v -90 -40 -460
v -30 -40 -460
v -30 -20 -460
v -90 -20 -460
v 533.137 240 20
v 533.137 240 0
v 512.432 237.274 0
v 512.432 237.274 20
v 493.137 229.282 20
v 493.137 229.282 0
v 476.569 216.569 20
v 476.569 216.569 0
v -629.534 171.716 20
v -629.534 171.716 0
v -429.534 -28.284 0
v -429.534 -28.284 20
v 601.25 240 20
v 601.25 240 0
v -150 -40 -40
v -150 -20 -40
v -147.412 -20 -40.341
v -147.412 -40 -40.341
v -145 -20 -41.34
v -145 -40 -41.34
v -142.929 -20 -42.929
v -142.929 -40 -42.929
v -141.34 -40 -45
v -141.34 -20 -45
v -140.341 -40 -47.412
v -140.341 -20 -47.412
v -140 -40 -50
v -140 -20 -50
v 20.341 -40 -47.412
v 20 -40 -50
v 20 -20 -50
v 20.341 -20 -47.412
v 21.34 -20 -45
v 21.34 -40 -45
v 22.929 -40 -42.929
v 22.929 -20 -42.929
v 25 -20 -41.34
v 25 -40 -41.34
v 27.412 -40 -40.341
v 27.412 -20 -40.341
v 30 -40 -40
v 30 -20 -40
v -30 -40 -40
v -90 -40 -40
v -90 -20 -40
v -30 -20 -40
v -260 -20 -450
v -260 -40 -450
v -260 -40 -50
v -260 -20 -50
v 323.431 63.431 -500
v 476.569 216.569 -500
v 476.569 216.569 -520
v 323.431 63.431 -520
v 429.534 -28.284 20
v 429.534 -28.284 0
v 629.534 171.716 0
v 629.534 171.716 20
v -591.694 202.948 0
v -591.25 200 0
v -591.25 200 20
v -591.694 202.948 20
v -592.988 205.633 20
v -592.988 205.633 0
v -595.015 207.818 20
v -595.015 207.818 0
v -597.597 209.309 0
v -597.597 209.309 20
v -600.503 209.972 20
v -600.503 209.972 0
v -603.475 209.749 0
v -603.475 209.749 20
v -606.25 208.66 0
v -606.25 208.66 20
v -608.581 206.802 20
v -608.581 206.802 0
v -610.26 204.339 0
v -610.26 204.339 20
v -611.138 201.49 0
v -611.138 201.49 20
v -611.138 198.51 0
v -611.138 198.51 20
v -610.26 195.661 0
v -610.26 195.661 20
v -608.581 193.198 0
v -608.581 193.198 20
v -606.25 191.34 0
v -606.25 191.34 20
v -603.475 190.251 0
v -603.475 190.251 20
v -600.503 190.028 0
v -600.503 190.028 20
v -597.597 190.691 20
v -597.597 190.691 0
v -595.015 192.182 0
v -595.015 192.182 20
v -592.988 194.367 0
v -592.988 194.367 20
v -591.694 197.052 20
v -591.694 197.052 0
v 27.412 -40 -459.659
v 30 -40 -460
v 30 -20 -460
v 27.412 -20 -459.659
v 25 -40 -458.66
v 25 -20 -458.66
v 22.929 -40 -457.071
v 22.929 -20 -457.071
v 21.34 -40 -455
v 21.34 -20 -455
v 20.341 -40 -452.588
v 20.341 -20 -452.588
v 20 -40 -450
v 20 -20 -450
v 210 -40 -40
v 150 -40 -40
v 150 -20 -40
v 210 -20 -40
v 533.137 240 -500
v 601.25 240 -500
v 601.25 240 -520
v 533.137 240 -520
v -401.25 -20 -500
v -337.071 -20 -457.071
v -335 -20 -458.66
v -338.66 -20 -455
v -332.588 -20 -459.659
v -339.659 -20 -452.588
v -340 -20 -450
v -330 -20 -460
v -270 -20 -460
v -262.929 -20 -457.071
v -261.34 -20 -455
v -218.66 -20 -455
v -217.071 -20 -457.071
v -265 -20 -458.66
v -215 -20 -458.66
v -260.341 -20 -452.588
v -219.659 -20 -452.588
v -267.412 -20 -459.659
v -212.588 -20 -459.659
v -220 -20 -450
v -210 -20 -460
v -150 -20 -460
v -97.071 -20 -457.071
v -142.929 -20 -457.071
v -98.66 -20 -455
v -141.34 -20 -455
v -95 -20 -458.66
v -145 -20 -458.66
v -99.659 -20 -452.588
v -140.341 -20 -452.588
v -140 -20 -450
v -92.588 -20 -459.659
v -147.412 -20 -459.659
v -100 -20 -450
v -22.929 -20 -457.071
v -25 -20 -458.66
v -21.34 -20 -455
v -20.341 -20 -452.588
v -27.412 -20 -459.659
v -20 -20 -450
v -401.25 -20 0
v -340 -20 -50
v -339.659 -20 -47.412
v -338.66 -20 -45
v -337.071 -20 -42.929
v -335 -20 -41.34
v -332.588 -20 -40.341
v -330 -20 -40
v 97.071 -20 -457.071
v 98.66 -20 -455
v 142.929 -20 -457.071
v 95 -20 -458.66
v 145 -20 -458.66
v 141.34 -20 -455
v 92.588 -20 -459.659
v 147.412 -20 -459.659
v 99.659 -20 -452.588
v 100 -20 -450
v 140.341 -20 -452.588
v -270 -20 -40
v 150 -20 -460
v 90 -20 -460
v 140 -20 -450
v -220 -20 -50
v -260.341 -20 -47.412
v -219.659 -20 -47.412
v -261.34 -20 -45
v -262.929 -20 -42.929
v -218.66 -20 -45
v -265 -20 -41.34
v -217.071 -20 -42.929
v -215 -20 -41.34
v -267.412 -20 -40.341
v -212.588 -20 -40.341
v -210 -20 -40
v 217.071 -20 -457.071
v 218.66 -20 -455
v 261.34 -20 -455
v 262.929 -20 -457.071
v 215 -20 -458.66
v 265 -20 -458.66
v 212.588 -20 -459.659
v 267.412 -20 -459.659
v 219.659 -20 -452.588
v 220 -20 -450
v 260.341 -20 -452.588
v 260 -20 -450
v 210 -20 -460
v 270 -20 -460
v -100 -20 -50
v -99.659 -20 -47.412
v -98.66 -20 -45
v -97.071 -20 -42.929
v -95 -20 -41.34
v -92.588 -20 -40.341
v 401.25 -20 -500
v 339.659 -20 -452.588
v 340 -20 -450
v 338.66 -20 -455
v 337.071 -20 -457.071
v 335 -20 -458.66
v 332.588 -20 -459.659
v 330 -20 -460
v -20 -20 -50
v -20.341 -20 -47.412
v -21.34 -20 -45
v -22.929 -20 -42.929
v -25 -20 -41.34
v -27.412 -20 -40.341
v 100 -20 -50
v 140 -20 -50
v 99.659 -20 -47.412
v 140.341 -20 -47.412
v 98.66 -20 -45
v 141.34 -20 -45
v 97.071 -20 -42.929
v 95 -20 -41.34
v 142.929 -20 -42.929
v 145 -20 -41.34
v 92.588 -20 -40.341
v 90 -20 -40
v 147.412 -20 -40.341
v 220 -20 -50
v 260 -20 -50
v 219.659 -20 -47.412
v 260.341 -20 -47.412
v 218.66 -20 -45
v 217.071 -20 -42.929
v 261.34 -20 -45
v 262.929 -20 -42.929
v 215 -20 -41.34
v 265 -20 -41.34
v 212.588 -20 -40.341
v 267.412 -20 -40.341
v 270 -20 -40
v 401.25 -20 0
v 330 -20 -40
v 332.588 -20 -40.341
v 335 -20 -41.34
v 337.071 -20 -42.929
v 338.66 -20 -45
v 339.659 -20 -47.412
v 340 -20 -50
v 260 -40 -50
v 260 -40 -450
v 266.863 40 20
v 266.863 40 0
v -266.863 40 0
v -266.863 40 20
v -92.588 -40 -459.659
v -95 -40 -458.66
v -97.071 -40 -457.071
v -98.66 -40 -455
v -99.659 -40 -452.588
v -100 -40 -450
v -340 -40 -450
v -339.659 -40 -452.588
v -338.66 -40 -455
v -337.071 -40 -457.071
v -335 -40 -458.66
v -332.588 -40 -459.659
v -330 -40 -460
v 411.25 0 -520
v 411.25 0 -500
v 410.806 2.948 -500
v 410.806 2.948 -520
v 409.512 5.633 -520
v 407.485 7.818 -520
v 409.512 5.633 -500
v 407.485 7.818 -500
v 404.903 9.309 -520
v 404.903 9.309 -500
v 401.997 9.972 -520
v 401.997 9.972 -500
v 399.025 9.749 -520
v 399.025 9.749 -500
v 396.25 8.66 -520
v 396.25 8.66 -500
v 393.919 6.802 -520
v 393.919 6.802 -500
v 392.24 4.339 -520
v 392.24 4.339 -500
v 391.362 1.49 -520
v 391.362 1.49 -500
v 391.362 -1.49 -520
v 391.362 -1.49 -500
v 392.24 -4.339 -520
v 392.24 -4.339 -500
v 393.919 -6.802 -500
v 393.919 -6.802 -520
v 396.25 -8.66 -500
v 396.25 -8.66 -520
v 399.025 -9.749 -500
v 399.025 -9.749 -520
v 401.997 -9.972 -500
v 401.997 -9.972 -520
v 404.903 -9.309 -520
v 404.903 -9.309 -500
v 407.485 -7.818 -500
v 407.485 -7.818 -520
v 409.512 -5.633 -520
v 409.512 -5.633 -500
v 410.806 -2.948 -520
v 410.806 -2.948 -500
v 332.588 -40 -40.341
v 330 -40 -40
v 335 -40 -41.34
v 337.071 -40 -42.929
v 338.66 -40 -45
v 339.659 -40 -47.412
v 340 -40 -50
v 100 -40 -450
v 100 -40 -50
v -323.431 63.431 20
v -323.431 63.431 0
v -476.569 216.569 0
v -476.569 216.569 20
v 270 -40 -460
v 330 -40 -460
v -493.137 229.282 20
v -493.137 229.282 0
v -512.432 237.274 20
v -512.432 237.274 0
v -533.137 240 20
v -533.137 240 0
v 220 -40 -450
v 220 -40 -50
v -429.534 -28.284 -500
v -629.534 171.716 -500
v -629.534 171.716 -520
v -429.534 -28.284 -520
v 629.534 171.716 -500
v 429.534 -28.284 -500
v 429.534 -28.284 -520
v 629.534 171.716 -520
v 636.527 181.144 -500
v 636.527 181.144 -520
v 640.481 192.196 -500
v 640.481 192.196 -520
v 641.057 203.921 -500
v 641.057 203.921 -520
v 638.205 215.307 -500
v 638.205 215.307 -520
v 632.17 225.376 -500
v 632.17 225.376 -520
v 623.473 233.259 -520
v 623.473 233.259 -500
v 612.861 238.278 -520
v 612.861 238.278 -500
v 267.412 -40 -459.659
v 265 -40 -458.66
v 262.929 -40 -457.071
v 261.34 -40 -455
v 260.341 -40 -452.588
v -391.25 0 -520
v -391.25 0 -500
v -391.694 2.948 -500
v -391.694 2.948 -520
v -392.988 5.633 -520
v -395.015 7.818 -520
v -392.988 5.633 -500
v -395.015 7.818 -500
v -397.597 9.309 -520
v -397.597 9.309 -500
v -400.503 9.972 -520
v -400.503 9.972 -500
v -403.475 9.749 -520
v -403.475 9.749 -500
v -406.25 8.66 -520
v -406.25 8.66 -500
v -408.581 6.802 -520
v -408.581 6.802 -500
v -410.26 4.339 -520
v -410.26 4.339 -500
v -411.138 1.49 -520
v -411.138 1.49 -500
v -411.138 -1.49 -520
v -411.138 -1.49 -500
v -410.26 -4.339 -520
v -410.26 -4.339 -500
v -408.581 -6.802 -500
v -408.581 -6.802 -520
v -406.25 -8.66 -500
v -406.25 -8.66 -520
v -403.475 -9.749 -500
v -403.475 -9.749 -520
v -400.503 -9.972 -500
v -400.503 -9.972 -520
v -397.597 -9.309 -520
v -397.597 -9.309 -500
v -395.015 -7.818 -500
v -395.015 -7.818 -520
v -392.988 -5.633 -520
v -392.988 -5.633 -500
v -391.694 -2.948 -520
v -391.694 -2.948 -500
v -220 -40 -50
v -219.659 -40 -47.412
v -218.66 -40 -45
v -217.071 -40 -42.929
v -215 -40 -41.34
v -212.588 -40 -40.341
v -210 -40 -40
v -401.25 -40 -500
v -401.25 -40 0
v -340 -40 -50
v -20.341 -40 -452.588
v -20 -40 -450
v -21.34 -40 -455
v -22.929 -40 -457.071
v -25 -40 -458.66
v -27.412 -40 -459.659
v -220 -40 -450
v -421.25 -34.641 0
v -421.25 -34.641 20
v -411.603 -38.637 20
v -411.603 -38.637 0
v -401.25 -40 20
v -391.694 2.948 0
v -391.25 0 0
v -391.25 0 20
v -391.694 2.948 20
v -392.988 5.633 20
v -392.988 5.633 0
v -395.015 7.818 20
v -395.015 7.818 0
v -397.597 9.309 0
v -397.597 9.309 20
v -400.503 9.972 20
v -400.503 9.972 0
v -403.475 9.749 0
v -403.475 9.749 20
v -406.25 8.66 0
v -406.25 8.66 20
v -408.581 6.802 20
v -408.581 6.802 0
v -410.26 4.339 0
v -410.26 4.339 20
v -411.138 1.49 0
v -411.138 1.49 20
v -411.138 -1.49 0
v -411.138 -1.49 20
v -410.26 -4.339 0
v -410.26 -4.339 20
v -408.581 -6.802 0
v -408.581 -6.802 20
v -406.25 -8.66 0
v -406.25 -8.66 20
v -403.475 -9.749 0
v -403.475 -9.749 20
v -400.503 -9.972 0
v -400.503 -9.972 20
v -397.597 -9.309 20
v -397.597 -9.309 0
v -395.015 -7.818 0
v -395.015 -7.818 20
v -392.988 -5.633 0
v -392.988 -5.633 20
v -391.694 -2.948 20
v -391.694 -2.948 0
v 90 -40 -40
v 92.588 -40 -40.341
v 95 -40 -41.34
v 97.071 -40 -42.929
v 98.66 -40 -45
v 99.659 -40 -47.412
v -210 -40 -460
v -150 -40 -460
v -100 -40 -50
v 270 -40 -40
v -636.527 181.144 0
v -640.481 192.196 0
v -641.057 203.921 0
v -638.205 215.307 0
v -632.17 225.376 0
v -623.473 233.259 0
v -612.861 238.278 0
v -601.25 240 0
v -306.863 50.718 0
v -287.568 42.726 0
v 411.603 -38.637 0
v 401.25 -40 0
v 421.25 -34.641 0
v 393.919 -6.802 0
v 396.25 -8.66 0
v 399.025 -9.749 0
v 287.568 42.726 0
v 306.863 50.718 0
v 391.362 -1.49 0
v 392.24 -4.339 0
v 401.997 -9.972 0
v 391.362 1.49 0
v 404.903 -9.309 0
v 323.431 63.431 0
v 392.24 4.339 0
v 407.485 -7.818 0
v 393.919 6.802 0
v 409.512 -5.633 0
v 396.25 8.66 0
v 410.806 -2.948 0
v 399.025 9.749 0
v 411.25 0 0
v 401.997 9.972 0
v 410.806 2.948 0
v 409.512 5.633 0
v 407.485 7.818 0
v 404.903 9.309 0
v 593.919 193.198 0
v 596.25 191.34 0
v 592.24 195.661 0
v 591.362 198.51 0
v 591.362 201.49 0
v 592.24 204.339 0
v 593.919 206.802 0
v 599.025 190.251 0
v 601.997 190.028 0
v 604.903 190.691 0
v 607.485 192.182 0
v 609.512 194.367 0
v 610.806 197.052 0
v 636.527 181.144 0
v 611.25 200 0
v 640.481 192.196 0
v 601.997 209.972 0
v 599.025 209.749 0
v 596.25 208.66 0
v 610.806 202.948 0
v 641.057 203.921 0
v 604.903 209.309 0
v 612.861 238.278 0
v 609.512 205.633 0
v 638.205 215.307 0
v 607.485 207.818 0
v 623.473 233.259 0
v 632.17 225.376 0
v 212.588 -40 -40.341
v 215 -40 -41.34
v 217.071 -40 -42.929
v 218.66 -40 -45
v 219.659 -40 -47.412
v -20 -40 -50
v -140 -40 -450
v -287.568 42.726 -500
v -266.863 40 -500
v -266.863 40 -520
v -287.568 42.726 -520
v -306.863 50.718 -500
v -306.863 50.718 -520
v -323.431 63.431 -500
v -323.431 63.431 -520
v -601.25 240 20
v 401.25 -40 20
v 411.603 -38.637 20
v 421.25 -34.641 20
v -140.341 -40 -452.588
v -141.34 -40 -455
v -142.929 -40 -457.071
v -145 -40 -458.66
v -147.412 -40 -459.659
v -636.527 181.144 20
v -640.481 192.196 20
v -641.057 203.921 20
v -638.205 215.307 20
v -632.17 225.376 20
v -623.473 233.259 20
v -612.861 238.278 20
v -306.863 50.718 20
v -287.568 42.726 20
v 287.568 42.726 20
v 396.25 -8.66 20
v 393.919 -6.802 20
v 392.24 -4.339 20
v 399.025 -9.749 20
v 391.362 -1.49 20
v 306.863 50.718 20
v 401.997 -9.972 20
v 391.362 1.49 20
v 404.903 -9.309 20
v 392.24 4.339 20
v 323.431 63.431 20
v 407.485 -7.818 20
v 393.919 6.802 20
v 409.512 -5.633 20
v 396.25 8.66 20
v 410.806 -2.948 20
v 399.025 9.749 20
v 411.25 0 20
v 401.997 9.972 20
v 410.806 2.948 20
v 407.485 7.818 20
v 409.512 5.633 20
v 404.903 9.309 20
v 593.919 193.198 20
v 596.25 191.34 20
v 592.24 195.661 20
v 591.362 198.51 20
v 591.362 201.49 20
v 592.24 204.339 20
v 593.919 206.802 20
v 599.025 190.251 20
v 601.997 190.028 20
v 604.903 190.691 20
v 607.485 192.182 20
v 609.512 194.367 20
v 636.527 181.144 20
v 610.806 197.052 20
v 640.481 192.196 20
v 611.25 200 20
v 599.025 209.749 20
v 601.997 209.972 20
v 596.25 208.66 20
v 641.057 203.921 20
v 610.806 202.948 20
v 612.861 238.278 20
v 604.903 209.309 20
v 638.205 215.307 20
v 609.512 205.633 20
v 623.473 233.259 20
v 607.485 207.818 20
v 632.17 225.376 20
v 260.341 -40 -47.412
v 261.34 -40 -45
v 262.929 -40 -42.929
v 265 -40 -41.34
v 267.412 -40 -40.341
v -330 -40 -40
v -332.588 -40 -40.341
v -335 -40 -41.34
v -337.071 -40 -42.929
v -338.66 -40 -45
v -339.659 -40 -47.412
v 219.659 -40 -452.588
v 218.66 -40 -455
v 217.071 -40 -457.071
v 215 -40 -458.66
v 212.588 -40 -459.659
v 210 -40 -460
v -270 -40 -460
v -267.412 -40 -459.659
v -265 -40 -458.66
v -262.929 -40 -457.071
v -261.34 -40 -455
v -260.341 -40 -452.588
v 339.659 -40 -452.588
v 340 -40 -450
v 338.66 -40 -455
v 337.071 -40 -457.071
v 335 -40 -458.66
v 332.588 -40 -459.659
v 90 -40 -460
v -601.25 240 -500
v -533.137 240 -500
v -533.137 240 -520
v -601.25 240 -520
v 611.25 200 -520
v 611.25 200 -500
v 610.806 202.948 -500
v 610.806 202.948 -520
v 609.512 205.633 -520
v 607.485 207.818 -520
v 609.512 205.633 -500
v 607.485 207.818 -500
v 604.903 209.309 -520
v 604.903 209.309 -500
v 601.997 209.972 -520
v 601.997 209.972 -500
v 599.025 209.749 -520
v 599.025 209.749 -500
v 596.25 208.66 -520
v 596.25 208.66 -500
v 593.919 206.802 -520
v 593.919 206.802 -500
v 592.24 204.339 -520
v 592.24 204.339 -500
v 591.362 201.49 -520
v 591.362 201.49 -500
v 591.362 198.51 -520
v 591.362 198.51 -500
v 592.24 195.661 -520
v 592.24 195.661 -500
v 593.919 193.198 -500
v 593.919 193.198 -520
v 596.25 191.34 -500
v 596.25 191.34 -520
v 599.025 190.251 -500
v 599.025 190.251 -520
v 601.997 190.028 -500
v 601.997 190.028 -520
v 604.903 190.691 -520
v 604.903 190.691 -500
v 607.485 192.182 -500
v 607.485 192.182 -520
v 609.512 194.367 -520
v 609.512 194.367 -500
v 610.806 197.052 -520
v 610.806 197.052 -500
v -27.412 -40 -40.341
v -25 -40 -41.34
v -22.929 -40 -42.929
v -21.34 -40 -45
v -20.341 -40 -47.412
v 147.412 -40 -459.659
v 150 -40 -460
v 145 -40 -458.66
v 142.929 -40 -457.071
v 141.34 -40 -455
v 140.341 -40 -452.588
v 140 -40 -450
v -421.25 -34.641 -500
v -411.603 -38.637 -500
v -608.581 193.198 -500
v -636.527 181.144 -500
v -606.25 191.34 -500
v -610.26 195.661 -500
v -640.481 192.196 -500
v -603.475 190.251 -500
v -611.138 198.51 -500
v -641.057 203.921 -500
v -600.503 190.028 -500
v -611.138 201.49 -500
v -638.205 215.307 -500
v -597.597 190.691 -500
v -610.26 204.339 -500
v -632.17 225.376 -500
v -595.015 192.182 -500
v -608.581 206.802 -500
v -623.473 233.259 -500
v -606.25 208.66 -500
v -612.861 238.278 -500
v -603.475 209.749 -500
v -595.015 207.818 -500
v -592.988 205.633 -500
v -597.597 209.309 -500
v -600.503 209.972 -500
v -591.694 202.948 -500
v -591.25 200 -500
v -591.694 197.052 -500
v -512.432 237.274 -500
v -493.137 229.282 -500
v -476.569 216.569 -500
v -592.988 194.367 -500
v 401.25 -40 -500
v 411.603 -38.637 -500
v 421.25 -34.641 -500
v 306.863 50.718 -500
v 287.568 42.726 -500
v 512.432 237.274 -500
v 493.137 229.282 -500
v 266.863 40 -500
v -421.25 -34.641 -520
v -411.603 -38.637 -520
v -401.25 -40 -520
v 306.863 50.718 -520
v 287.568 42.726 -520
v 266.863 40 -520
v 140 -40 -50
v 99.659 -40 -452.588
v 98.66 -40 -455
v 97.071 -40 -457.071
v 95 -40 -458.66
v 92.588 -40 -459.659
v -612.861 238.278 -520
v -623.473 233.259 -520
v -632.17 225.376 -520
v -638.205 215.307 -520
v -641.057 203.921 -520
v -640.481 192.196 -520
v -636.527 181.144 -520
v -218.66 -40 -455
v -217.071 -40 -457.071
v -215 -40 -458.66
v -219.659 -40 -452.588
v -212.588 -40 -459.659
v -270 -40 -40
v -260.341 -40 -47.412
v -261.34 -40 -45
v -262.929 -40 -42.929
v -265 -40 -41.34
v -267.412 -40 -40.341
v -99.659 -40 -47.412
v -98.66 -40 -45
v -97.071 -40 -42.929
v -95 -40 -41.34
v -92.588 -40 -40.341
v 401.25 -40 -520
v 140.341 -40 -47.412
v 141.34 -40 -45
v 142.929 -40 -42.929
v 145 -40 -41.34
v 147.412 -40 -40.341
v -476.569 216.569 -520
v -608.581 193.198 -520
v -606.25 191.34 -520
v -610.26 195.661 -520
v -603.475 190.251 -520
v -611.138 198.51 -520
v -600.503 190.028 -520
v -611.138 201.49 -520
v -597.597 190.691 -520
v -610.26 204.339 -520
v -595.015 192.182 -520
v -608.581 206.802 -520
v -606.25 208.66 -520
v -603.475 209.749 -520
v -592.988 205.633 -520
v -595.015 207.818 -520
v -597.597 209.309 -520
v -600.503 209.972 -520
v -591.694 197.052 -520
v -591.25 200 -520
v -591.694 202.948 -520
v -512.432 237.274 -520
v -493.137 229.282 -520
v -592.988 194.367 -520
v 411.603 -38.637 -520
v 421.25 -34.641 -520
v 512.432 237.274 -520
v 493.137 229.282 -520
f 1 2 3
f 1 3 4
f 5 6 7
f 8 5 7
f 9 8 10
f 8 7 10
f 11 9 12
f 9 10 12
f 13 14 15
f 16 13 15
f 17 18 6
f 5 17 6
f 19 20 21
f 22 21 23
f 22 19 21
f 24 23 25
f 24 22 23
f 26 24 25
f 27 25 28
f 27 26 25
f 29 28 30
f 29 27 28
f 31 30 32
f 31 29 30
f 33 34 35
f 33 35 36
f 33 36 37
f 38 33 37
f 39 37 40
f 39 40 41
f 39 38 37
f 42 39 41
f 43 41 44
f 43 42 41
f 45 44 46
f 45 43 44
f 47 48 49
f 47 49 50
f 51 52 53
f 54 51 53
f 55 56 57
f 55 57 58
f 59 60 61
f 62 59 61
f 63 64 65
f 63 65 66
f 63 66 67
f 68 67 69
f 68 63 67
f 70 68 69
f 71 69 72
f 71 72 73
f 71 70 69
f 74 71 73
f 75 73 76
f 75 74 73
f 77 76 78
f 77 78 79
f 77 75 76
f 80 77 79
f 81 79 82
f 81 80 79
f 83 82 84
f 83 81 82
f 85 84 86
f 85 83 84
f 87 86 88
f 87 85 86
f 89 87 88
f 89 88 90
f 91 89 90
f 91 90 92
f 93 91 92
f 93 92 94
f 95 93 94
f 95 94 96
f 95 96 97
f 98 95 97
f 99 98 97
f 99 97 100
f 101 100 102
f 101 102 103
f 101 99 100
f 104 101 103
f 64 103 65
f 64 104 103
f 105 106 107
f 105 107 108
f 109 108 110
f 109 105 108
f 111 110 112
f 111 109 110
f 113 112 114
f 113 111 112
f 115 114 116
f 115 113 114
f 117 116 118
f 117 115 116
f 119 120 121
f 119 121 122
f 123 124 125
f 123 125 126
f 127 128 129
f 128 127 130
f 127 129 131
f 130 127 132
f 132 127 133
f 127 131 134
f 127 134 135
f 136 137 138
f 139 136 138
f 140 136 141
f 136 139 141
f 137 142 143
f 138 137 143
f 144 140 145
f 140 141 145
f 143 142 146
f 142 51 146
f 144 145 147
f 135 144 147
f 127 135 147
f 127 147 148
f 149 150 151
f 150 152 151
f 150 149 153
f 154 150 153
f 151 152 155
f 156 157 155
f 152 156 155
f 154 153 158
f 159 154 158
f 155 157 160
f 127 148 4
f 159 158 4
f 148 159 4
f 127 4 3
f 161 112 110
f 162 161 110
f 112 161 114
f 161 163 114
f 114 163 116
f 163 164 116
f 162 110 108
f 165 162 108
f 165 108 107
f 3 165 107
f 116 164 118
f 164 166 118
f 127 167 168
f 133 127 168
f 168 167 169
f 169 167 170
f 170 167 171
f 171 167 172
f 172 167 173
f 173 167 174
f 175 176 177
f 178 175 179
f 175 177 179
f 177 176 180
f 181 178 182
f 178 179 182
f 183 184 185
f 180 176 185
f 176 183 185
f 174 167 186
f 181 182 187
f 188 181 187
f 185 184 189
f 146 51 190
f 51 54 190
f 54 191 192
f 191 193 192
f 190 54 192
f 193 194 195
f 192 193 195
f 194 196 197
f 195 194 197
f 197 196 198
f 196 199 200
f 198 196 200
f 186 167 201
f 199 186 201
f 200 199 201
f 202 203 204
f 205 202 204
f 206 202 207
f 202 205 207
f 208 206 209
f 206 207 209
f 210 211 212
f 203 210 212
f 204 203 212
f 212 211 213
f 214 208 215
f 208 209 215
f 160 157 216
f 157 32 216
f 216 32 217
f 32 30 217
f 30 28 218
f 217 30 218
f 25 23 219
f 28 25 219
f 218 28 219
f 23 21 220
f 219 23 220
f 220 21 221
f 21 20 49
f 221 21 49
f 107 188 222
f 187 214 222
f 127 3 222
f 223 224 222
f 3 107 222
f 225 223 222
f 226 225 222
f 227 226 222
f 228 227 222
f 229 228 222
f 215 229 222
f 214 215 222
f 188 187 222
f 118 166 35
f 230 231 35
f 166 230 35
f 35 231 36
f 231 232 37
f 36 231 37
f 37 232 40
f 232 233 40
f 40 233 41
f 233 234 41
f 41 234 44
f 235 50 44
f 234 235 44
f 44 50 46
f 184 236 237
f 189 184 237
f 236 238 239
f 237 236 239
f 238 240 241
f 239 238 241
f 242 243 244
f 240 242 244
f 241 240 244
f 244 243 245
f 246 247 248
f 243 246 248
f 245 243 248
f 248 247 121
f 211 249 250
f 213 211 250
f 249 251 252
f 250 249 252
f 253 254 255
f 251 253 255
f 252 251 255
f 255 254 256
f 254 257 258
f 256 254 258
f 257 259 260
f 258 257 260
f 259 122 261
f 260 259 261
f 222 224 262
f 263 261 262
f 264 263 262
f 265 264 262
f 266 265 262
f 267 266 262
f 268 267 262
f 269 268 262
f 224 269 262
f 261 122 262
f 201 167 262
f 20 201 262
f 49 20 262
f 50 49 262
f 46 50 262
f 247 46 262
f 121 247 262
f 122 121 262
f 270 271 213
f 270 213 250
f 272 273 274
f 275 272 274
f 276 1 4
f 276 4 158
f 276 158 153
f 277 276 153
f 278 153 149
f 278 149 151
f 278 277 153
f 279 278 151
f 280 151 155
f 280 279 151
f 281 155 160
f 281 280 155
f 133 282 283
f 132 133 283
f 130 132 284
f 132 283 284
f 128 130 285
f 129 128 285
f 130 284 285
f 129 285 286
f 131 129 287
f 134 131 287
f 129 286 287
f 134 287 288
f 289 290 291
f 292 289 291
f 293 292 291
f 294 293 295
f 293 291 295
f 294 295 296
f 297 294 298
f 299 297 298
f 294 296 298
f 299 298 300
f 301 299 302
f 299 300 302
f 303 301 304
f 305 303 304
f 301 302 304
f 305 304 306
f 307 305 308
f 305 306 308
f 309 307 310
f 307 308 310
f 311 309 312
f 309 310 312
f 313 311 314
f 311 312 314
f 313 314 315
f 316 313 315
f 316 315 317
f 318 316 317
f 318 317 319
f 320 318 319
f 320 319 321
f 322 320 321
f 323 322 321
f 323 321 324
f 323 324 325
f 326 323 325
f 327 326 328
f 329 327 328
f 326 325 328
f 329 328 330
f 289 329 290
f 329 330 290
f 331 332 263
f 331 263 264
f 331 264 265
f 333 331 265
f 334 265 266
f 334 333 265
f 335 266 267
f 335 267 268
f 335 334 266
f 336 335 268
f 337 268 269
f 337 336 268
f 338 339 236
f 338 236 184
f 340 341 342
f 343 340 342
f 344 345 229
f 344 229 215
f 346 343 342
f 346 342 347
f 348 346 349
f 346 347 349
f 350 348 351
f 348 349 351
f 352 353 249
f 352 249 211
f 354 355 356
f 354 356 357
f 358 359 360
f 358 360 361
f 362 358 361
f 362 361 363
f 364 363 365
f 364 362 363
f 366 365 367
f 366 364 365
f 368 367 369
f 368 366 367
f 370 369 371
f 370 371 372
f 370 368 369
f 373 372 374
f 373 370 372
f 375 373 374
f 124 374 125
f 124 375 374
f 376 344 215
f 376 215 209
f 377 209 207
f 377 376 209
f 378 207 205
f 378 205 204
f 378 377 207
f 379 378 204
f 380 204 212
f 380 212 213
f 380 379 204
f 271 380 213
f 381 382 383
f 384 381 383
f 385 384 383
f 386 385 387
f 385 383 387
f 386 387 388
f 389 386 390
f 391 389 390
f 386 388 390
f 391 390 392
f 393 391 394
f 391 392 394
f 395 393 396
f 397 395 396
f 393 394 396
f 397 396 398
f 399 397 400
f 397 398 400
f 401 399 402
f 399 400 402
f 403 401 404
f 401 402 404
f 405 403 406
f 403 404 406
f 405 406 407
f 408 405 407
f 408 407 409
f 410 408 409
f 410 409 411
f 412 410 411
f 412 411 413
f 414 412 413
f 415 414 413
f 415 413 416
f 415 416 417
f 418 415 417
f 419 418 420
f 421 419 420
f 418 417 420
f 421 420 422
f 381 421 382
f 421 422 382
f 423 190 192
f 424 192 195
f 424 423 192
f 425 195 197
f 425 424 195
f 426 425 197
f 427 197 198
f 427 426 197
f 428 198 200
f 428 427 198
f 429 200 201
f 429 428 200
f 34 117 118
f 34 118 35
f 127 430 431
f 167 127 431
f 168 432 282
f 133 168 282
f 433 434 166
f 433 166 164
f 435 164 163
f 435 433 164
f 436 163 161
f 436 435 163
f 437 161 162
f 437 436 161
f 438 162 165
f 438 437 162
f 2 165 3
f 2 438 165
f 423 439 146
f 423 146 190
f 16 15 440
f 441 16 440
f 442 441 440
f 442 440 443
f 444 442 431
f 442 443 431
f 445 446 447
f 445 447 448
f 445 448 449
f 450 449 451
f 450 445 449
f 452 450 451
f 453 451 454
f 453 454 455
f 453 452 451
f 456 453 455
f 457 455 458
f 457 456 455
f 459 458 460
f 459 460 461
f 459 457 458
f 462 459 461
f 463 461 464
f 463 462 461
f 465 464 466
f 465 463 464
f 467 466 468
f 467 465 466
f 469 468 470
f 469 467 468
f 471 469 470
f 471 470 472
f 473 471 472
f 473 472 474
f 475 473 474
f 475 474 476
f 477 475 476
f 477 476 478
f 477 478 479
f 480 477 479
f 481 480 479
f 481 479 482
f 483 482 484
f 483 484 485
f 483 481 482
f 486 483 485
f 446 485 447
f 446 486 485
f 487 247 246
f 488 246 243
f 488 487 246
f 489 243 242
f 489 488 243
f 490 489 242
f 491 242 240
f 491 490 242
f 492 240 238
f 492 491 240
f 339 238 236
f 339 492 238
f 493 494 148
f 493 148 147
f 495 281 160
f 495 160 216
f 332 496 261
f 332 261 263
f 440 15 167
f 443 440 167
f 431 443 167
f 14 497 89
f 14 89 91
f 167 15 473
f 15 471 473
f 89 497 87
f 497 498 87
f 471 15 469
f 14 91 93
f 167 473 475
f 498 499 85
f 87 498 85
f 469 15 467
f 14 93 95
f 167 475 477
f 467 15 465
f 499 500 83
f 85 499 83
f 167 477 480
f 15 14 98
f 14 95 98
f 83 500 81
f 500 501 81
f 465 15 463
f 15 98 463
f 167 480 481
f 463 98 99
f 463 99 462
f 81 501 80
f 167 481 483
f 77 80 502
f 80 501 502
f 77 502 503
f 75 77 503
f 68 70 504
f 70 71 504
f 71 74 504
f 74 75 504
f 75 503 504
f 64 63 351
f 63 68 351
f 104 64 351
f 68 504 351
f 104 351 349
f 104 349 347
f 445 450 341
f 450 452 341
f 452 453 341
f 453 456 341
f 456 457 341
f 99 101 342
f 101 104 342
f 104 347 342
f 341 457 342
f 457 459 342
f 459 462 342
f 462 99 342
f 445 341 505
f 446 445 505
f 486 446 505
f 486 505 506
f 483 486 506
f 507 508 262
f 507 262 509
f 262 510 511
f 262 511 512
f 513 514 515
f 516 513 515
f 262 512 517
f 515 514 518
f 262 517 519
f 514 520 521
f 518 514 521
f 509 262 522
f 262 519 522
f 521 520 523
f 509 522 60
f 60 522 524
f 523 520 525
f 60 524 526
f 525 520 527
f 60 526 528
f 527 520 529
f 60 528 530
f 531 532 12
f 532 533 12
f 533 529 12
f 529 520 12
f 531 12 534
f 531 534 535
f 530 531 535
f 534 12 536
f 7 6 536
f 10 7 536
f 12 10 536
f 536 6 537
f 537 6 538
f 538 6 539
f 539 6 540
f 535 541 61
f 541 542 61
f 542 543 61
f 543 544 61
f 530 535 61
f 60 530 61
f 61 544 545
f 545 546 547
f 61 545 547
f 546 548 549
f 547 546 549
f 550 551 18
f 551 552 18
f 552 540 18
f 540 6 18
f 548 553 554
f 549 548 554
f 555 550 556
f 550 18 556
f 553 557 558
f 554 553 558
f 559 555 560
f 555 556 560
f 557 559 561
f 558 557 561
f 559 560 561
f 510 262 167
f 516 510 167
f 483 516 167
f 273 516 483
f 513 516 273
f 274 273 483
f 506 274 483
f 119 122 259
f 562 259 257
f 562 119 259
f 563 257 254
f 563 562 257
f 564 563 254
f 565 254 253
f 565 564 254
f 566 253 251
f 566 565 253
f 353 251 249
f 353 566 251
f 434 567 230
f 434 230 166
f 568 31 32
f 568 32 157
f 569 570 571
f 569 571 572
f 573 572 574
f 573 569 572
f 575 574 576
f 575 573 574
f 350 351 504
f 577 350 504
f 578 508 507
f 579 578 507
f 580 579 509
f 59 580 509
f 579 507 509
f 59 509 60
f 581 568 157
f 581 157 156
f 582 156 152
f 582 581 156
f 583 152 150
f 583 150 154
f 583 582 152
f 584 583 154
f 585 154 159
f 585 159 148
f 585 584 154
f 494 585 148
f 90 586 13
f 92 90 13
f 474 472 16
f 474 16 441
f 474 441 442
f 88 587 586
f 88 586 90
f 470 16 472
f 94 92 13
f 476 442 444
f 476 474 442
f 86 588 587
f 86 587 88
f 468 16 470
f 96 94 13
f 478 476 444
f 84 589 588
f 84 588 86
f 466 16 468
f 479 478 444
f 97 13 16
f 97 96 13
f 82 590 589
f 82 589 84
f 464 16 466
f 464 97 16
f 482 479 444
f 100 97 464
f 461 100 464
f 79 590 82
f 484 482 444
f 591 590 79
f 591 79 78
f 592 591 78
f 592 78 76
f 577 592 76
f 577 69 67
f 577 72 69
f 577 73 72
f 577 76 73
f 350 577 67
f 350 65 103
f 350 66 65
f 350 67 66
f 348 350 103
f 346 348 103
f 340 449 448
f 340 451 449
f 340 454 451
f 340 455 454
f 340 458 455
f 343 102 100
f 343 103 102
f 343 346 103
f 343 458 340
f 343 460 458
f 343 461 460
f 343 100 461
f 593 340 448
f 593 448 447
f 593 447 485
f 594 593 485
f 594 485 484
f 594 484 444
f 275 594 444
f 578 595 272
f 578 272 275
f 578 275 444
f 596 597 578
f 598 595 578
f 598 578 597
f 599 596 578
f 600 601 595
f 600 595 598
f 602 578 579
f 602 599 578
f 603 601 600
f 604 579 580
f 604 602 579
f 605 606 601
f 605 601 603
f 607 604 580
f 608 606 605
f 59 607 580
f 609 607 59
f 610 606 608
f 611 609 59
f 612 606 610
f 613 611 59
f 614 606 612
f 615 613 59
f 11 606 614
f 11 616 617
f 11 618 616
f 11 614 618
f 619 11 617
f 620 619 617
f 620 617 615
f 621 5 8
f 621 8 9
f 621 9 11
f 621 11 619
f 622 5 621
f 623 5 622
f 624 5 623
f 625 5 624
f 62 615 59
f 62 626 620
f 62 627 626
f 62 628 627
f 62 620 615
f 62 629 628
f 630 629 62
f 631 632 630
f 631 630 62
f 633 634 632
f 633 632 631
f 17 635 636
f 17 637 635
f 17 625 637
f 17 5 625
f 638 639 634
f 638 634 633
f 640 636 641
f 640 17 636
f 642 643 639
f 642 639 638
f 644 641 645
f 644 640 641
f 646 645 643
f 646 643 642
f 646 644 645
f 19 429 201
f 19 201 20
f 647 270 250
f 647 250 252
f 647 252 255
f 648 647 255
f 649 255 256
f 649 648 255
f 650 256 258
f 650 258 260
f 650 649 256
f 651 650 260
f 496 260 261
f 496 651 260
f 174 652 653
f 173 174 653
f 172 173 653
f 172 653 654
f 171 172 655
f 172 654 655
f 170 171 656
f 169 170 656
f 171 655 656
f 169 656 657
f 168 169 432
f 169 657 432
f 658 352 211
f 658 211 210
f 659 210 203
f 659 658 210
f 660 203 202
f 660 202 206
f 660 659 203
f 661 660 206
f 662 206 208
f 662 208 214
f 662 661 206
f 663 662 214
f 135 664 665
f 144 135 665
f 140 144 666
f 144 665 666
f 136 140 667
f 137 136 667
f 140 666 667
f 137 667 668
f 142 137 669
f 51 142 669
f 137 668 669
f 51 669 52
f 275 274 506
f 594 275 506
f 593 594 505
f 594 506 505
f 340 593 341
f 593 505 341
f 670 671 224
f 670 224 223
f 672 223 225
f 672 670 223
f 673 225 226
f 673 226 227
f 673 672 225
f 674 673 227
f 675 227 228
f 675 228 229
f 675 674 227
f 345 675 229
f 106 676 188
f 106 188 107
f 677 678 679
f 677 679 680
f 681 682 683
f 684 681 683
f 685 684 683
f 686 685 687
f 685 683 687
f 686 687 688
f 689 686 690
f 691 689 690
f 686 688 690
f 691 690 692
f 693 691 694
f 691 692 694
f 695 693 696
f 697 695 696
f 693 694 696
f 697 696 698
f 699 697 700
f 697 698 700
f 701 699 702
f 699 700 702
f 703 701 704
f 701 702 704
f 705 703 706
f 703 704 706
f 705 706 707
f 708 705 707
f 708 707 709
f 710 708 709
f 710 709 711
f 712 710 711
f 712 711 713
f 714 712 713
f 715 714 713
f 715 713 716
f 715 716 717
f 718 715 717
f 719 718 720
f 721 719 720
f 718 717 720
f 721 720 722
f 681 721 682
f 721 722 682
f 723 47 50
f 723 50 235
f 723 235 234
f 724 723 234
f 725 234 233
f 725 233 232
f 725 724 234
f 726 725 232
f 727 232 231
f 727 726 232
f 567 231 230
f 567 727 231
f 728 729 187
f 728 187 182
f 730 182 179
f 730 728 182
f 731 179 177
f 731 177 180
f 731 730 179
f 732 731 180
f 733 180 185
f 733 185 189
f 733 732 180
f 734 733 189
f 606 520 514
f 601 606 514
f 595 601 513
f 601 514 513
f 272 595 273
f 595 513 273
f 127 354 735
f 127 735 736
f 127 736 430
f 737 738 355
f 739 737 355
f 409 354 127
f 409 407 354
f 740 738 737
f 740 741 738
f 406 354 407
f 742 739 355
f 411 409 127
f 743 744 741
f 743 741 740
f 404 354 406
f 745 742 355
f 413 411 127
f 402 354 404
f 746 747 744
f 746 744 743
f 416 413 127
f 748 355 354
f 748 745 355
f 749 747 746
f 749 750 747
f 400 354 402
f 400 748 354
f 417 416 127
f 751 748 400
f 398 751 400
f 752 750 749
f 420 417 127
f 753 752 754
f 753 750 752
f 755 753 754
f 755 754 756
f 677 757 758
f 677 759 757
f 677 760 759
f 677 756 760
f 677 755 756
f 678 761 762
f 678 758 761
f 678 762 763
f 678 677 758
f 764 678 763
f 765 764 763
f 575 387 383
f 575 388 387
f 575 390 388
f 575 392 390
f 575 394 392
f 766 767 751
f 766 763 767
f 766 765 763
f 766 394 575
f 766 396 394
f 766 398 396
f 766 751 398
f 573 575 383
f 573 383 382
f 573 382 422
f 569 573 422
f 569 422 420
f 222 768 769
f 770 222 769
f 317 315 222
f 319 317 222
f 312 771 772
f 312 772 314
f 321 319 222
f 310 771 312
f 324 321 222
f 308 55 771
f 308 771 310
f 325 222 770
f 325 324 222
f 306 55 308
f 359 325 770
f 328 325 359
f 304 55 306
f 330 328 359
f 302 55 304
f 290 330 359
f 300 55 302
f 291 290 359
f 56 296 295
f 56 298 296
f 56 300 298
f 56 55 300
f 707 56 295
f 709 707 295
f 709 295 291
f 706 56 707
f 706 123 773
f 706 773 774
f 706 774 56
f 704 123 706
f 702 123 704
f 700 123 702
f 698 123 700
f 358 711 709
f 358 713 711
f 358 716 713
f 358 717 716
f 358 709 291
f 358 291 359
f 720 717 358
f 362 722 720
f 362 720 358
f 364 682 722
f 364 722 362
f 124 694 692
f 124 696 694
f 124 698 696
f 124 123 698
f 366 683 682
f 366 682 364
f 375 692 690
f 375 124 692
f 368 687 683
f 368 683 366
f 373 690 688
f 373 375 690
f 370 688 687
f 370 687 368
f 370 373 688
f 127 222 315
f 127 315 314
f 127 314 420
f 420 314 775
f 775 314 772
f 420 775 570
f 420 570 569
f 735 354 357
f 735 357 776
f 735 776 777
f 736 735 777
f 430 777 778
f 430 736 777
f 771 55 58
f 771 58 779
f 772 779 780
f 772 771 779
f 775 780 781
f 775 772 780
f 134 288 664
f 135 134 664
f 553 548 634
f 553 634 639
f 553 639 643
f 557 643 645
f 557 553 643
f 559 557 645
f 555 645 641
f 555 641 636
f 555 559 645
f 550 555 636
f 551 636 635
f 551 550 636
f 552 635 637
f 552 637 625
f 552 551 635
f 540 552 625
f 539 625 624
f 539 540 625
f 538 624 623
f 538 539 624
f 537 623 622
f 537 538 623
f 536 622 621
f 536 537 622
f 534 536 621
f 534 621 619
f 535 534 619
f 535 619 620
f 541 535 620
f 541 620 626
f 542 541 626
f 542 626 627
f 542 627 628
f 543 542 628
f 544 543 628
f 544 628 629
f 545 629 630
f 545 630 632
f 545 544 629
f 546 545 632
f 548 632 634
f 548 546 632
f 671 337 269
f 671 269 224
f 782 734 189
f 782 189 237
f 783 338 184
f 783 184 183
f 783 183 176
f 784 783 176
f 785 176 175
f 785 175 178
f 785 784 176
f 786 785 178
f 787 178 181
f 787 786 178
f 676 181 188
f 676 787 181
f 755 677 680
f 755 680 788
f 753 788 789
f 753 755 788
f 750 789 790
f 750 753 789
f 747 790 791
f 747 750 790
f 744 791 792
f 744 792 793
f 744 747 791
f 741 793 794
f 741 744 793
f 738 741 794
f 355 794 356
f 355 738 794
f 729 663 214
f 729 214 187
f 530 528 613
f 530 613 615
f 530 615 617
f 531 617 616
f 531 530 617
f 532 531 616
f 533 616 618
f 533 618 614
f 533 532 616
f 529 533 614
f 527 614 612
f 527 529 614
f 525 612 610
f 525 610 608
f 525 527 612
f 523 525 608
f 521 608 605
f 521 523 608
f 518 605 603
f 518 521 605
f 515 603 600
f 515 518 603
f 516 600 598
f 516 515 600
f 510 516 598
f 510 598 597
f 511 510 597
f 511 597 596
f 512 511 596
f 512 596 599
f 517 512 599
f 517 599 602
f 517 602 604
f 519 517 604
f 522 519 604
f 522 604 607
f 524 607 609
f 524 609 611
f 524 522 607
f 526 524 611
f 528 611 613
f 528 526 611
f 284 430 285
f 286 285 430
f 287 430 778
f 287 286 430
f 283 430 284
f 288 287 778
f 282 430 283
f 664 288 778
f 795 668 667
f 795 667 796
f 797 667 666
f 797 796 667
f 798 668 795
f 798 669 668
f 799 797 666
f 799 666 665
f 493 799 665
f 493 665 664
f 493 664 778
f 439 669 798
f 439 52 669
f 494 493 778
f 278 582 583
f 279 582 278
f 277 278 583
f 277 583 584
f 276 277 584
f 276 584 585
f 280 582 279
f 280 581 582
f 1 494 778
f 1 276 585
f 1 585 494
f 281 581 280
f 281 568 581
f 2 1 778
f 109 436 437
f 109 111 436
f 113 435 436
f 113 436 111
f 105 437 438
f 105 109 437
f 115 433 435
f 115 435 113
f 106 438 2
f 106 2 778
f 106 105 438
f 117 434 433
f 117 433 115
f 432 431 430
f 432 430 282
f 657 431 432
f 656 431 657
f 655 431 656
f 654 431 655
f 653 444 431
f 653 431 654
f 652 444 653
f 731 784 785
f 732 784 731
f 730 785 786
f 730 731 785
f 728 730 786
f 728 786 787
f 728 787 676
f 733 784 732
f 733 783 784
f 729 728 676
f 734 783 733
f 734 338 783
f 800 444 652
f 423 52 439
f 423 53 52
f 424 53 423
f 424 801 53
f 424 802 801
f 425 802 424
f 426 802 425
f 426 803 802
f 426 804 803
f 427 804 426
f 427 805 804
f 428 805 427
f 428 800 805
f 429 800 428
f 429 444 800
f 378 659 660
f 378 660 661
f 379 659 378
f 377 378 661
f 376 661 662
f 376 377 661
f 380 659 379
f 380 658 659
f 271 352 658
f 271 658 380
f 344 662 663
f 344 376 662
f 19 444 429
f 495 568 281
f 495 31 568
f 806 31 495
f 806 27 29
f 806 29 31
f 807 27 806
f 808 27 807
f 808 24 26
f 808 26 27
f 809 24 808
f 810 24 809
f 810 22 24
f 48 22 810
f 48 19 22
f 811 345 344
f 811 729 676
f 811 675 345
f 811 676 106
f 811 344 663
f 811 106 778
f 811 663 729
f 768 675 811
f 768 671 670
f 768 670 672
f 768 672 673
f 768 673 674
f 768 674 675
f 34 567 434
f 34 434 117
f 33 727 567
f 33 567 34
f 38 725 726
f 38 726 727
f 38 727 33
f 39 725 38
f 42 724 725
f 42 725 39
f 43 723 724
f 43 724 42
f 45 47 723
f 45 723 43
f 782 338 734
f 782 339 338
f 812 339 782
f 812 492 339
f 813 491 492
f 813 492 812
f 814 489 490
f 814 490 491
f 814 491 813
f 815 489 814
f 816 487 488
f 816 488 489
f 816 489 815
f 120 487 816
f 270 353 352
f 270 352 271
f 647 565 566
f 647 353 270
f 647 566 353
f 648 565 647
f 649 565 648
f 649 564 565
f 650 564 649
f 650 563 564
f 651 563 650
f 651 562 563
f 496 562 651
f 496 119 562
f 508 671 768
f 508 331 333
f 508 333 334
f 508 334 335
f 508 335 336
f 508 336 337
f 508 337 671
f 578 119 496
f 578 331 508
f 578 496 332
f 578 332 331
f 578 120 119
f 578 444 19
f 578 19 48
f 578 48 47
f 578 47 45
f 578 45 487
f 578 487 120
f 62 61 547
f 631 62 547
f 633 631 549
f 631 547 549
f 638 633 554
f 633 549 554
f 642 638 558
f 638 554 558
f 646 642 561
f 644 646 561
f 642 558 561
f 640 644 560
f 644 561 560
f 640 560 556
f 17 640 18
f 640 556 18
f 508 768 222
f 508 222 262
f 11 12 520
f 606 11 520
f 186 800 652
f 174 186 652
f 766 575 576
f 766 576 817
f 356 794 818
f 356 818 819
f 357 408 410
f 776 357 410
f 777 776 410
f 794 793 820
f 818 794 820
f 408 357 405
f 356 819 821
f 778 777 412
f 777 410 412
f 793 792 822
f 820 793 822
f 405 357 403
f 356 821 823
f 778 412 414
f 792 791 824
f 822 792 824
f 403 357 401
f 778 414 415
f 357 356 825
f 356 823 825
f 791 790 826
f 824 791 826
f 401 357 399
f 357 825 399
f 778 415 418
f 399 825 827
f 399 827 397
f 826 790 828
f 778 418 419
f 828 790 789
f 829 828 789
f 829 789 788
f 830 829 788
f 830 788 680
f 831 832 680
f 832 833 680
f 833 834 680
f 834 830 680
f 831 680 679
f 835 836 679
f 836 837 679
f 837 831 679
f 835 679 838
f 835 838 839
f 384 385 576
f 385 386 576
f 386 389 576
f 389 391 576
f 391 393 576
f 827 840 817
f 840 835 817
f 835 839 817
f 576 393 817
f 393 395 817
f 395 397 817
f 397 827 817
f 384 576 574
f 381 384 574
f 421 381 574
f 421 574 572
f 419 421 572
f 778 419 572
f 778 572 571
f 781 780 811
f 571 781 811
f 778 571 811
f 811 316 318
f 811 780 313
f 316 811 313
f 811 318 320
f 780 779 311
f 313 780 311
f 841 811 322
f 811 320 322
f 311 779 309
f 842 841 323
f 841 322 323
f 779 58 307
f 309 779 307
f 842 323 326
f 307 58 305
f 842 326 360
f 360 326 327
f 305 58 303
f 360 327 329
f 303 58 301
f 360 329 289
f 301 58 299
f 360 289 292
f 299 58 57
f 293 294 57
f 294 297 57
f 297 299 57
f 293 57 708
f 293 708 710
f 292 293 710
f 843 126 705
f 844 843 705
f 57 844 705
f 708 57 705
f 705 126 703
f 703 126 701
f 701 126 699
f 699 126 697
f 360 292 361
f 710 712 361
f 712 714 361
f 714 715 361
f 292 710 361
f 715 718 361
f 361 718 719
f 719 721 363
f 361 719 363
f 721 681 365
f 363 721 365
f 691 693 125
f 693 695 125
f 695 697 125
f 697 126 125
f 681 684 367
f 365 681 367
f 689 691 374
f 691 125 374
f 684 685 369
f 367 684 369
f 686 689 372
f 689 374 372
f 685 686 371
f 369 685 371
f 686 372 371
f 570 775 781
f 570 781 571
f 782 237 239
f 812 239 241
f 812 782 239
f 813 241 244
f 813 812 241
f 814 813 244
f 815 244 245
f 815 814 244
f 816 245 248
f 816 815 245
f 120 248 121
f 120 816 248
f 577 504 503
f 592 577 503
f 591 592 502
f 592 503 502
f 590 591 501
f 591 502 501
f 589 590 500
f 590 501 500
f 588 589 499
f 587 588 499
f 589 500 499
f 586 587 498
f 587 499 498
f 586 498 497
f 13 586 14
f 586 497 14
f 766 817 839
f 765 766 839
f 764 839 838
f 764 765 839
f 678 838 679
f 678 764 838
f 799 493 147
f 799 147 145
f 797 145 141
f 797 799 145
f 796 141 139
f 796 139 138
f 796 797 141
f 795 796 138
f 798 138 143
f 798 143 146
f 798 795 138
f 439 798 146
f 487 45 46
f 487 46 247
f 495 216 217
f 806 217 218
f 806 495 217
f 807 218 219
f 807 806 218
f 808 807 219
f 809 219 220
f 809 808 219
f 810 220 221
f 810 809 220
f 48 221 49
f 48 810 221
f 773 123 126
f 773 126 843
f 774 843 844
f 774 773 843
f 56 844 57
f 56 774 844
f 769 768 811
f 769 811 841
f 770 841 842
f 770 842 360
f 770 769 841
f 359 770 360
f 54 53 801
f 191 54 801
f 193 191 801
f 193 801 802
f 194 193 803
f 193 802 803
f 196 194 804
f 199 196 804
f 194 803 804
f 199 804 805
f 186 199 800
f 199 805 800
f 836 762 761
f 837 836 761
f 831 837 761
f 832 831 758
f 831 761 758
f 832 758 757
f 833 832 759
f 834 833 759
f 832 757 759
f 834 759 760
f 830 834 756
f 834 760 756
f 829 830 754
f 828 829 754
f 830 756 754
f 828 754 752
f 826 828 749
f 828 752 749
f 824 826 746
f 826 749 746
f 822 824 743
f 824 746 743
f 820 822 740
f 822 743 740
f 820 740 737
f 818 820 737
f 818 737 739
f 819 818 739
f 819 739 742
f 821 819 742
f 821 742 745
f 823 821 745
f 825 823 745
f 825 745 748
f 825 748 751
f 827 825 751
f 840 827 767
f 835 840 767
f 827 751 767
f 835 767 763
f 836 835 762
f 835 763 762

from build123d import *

# Parameters (mm, degrees)
SKETCH1_R           = 10
BOSS_EXTRUDE1_DEPTH = 20
SKETCH2_W           = 802.5
SKETCH2_H           = 500
BOSS_EXTRUDE3_DEPTH = 20


with BuildPart() as part:
    # Sketch1 → Boss-Extrude1 (new body)
    with BuildSketch(Plane.XY):
        with BuildLine():
            Line((-401.25, -40), (401.25, -40))
            ThreePointArc((401.25, -40), (416.557337295, -36.9551813), (429.534271247, -28.284271247))
            Line((429.534271247, -28.284271247), (629.534271247, 171.715728753))
            ThreePointArc((629.534271247, 171.715728753), (638.2051813, 215.307337295), (601.25, 240))
            Line((601.25, 240), (533.13708499, 240))
            ThreePointArc((533.13708499, 240), (502.522410401, 233.910362601), (476.568542495, 216.568542495))
            Line((476.568542495, 216.568542495), (323.431457505, 63.431457505))
            ThreePointArc((323.431457505, 63.431457505), (297.477589599, 46.089637399), (266.86291501, 40))
            Line((266.86291501, 40), (-266.86291501, 40))
            ThreePointArc((-266.86291501, 40), (-297.477589599, 46.089637399), (-323.431457505, 63.431457505))
            Line((-323.431457505, 63.431457505), (-476.568542495, 216.568542495))
            ThreePointArc((-476.568542495, 216.568542495), (-502.522410401, 233.910362601), (-533.13708499, 240))
            Line((-533.13708499, 240), (-601.25, 240))
            ThreePointArc((-601.25, 240), (-638.2051813, 215.307337295), (-629.534271247, 171.715728753))
            Line((-629.534271247, 171.715728753), (-429.534271247, -28.284271247))
            ThreePointArc((-429.534271247, -28.284271247), (-416.557337295, -36.9551813), (-401.25, -40))
        make_face()
        with Locations((601.25, 200)):
            Circle(SKETCH1_R, mode=Mode.SUBTRACT)
        with Locations((401.25, 0)):
            Circle(SKETCH1_R, mode=Mode.SUBTRACT)
        with Locations((-401.25, 0)):
            Circle(SKETCH1_R, mode=Mode.SUBTRACT)
        with Locations((-601.25, 200)):
            Circle(SKETCH1_R, mode=Mode.SUBTRACT)
    boss_extrude1 = extrude(amount=BOSS_EXTRUDE1_DEPTH)

    # Sketch2 → Boss-Extrude3 (add)
    with BuildSketch(Plane.XZ.offset(40)):
        with Locations((0, -250)):
            Rectangle(SKETCH2_W, SKETCH2_H)
        with BuildLine():
            Line((-330, -460), (-270, -460))
            ThreePointArc((-270, -460), (-262.928932188, -457.071067812), (-260, -450))
            Line((-260, -450), (-260, -50))
            ThreePointArc((-260, -50), (-262.928932188, -42.928932188), (-270, -40))
            Line((-270, -40), (-330, -40))
            ThreePointArc((-330, -40), (-337.071067812, -42.928932188), (-340, -50))
            Line((-340, -50), (-340, -450))
            ThreePointArc((-340, -450), (-337.071067812, -457.071067812), (-330, -460))
        make_face(mode=Mode.SUBTRACT)
        with BuildLine():
            Line((-220, -450), (-220, -50))
            ThreePointArc((-220, -50), (-217.071067812, -42.928932188), (-210, -40))
            Line((-210, -40), (-150, -40))
            ThreePointArc((-150, -40), (-142.928932188, -42.928932188), (-140, -50))
            Line((-140, -50), (-140, -450))
            ThreePointArc((-140, -450), (-142.928932188, -457.071067812), (-150, -460))
            Line((-150, -460), (-210, -460))
            ThreePointArc((-210, -460), (-217.071067812, -457.071067812), (-220, -450))
        make_face(mode=Mode.SUBTRACT)
        with BuildLine():
            Line((-100, -450), (-100, -50))
            ThreePointArc((-100, -50), (-97.071067812, -42.928932188), (-90, -40))
            Line((-90, -40), (-30, -40))
            ThreePointArc((-30, -40), (-22.928932188, -42.928932188), (-20, -50))
            Line((-20, -50), (-20, -450))
            ThreePointArc((-20, -450), (-22.928932188, -457.071067812), (-30, -460))
            Line((-30, -460), (-90, -460))
            ThreePointArc((-90, -460), (-97.071067812, -457.071067812), (-100, -450))
        make_face(mode=Mode.SUBTRACT)
        with BuildLine():
            Line((20, -450), (20, -50))
            ThreePointArc((20, -50), (22.928932188, -42.928932188), (30, -40))
            Line((30, -40), (90, -40))
            ThreePointArc((90, -40), (97.071067812, -42.928932188), (100, -50))
            Line((100, -50), (100, -450))
            ThreePointArc((100, -450), (97.071067812, -457.071067812), (90, -460))
            Line((90, -460), (30, -460))
            ThreePointArc((30, -460), (22.928932188, -457.071067812), (20, -450))
        make_face(mode=Mode.SUBTRACT)
        with BuildLine():
            Line((140, -450), (140, -50))
            ThreePointArc((140, -50), (142.928932188, -42.928932188), (150, -40))
            Line((150, -40), (210, -40))
            ThreePointArc((210, -40), (217.071067812, -42.928932188), (220, -50))
            Line((220, -50), (220, -450))
            ThreePointArc((220, -450), (217.071067812, -457.071067812), (210, -460))
            Line((210, -460), (150, -460))
            ThreePointArc((150, -460), (142.928932188, -457.071067812), (140, -450))
        make_face(mode=Mode.SUBTRACT)
        with BuildLine():
            Line((260, -450), (260, -50))
            ThreePointArc((260, -50), (262.928932188, -42.928932188), (270, -40))
            Line((270, -40), (330, -40))
            ThreePointArc((330, -40), (337.071067812, -42.928932188), (340, -50))
            Line((340, -50), (340, -450))
            ThreePointArc((340, -450), (337.071067812, -457.071067812), (330, -460))
            Line((330, -460), (270, -460))
            ThreePointArc((270, -460), (262.928932188, -457.071067812), (260, -450))
        make_face(mode=Mode.SUBTRACT)
    extrude(amount=-BOSS_EXTRUDE3_DEPTH)

    # Mirror1: Boss-Extrude1 across plane
    add(boss_extrude1.mirror(Plane(origin=(0, 0, -250), x_dir=(1, 0, 0), z_dir=(0, 0, -1))))


solid = part.part
